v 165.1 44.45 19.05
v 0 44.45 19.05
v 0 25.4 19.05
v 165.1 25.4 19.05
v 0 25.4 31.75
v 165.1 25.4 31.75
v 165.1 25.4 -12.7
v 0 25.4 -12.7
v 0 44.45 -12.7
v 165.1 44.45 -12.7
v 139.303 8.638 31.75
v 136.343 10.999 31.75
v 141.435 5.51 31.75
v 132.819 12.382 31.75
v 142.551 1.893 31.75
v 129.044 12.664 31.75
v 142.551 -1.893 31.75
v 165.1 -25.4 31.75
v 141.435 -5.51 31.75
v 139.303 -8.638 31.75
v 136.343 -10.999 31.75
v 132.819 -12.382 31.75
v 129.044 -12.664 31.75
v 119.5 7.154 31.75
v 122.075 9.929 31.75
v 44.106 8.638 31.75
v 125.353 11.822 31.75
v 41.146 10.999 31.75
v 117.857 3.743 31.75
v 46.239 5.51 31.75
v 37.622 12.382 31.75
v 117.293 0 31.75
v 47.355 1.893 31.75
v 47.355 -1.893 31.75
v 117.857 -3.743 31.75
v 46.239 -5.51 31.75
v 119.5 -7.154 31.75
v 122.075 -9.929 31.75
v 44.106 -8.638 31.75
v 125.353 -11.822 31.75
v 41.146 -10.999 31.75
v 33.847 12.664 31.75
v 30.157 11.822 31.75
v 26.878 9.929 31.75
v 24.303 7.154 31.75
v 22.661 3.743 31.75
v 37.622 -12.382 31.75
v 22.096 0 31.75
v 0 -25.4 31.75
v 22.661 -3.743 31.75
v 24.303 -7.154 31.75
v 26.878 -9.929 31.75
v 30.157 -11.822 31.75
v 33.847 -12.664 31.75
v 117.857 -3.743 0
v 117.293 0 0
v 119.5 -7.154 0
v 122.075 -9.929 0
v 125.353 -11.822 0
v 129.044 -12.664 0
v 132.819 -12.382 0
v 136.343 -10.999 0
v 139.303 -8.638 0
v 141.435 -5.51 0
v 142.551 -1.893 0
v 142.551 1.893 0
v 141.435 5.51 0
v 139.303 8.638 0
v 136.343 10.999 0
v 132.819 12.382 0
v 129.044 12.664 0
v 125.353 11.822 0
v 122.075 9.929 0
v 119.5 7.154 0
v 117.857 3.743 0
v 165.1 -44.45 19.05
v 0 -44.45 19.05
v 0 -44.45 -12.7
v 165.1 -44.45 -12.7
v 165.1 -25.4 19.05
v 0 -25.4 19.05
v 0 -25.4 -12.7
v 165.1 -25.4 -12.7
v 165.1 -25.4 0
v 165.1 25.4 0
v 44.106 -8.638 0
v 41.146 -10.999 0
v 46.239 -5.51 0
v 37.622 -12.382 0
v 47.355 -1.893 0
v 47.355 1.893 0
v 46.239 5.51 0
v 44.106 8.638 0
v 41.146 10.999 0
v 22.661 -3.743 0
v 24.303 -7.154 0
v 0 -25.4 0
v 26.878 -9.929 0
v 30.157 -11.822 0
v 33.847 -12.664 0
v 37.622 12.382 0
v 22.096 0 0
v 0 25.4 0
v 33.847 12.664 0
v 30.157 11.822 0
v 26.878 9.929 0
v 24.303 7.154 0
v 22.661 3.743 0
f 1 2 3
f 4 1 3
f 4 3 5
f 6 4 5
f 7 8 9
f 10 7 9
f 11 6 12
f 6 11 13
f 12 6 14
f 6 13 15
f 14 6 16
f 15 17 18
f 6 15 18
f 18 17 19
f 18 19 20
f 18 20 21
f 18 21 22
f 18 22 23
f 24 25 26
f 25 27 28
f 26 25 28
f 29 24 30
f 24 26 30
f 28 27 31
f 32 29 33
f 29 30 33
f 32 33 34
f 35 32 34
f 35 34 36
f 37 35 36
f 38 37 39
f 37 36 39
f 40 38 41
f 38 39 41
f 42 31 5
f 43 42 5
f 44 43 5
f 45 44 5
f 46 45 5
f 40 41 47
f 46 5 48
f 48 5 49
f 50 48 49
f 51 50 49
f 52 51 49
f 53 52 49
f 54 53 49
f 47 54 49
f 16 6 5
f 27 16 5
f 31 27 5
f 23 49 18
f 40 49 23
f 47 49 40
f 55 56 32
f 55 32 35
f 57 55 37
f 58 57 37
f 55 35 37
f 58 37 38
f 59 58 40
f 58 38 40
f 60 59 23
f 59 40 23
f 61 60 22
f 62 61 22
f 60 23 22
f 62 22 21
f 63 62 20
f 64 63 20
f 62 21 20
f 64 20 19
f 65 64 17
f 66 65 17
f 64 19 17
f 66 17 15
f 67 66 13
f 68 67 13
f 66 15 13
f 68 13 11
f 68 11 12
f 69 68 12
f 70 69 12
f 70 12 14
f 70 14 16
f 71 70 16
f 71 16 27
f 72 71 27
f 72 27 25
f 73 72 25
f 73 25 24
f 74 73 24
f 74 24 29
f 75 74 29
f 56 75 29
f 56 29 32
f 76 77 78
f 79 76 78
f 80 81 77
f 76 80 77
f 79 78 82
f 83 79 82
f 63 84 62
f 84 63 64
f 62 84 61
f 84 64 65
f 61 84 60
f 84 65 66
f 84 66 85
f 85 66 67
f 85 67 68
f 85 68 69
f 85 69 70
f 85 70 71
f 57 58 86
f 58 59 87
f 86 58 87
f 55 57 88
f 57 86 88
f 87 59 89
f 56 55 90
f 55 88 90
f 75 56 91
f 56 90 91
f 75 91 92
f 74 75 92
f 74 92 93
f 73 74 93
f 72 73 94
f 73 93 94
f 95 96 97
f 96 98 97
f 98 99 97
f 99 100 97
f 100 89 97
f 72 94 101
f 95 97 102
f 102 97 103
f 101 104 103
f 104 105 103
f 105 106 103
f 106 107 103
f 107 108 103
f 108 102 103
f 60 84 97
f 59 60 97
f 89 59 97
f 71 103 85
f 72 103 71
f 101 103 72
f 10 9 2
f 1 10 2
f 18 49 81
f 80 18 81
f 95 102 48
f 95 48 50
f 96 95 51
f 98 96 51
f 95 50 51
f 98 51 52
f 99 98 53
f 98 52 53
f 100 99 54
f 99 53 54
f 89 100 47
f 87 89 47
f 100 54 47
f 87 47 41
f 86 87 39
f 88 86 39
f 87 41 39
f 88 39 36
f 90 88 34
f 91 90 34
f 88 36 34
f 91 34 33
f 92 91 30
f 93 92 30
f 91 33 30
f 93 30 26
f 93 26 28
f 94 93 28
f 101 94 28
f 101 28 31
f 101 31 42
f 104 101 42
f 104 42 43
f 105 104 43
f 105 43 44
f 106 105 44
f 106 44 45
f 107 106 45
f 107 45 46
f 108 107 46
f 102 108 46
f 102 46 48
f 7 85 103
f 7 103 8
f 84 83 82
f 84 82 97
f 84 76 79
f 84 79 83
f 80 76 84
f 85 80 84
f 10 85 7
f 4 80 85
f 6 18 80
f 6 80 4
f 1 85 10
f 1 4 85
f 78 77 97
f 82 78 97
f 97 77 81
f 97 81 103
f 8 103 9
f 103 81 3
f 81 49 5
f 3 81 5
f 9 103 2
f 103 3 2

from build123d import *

# Parameters (mm, degrees)
F1_DEPTH = 165.1
F4_DEPTH = 44.451


with BuildPart() as f1:
    # F0 (on Right) → F1 (new body)
    with BuildSketch(Plane.YZ):
        Polygon((-25.4, 0), (0, 0), (25.4, 0), (25.4, -12.7), (44.45, -12.7), (44.45, 19.05), (25.4, 19.05), (25.4, 31.75), (-25.4, 31.75), (-25.4, 19.05), (-44.45, 19.05), (-44.45, -12.7), (-25.4, -12.7), align=None)
    extrude(amount=F1_DEPTH)

    # F3 (on face) → F4 (cut, through all)
    with BuildSketch(Plane.XY.offset(31.75)):
        with BuildLine():
            Line((34.925, 0), (47.496461463, 0))
            ThreePointArc((47.496461463, 0), (34.796461463, 12.7), (22.096461463, 0))
            Line((22.096461463, 0), (34.925, 0))
        make_face()
        with BuildLine():
            ThreePointArc((22.096461463, 0), (34.796461463, -12.7), (47.496461463, 0))
            Line((47.496461463, 0), (34.925, 0))
            Line((34.925, 0), (22.096461463, 0))
        make_face()
        with BuildLine():
            ThreePointArc((142.6928426743, 0), (129.9928426743, 12.7), (117.2928426743, 0))
            ThreePointArc((117.2928426743, 0), (129.9928426743, -12.7), (142.6928426743, 0))
        make_face()
    extrude(amount=-F4_DEPTH, mode=Mode.SUBTRACT)


solid = f1.part
